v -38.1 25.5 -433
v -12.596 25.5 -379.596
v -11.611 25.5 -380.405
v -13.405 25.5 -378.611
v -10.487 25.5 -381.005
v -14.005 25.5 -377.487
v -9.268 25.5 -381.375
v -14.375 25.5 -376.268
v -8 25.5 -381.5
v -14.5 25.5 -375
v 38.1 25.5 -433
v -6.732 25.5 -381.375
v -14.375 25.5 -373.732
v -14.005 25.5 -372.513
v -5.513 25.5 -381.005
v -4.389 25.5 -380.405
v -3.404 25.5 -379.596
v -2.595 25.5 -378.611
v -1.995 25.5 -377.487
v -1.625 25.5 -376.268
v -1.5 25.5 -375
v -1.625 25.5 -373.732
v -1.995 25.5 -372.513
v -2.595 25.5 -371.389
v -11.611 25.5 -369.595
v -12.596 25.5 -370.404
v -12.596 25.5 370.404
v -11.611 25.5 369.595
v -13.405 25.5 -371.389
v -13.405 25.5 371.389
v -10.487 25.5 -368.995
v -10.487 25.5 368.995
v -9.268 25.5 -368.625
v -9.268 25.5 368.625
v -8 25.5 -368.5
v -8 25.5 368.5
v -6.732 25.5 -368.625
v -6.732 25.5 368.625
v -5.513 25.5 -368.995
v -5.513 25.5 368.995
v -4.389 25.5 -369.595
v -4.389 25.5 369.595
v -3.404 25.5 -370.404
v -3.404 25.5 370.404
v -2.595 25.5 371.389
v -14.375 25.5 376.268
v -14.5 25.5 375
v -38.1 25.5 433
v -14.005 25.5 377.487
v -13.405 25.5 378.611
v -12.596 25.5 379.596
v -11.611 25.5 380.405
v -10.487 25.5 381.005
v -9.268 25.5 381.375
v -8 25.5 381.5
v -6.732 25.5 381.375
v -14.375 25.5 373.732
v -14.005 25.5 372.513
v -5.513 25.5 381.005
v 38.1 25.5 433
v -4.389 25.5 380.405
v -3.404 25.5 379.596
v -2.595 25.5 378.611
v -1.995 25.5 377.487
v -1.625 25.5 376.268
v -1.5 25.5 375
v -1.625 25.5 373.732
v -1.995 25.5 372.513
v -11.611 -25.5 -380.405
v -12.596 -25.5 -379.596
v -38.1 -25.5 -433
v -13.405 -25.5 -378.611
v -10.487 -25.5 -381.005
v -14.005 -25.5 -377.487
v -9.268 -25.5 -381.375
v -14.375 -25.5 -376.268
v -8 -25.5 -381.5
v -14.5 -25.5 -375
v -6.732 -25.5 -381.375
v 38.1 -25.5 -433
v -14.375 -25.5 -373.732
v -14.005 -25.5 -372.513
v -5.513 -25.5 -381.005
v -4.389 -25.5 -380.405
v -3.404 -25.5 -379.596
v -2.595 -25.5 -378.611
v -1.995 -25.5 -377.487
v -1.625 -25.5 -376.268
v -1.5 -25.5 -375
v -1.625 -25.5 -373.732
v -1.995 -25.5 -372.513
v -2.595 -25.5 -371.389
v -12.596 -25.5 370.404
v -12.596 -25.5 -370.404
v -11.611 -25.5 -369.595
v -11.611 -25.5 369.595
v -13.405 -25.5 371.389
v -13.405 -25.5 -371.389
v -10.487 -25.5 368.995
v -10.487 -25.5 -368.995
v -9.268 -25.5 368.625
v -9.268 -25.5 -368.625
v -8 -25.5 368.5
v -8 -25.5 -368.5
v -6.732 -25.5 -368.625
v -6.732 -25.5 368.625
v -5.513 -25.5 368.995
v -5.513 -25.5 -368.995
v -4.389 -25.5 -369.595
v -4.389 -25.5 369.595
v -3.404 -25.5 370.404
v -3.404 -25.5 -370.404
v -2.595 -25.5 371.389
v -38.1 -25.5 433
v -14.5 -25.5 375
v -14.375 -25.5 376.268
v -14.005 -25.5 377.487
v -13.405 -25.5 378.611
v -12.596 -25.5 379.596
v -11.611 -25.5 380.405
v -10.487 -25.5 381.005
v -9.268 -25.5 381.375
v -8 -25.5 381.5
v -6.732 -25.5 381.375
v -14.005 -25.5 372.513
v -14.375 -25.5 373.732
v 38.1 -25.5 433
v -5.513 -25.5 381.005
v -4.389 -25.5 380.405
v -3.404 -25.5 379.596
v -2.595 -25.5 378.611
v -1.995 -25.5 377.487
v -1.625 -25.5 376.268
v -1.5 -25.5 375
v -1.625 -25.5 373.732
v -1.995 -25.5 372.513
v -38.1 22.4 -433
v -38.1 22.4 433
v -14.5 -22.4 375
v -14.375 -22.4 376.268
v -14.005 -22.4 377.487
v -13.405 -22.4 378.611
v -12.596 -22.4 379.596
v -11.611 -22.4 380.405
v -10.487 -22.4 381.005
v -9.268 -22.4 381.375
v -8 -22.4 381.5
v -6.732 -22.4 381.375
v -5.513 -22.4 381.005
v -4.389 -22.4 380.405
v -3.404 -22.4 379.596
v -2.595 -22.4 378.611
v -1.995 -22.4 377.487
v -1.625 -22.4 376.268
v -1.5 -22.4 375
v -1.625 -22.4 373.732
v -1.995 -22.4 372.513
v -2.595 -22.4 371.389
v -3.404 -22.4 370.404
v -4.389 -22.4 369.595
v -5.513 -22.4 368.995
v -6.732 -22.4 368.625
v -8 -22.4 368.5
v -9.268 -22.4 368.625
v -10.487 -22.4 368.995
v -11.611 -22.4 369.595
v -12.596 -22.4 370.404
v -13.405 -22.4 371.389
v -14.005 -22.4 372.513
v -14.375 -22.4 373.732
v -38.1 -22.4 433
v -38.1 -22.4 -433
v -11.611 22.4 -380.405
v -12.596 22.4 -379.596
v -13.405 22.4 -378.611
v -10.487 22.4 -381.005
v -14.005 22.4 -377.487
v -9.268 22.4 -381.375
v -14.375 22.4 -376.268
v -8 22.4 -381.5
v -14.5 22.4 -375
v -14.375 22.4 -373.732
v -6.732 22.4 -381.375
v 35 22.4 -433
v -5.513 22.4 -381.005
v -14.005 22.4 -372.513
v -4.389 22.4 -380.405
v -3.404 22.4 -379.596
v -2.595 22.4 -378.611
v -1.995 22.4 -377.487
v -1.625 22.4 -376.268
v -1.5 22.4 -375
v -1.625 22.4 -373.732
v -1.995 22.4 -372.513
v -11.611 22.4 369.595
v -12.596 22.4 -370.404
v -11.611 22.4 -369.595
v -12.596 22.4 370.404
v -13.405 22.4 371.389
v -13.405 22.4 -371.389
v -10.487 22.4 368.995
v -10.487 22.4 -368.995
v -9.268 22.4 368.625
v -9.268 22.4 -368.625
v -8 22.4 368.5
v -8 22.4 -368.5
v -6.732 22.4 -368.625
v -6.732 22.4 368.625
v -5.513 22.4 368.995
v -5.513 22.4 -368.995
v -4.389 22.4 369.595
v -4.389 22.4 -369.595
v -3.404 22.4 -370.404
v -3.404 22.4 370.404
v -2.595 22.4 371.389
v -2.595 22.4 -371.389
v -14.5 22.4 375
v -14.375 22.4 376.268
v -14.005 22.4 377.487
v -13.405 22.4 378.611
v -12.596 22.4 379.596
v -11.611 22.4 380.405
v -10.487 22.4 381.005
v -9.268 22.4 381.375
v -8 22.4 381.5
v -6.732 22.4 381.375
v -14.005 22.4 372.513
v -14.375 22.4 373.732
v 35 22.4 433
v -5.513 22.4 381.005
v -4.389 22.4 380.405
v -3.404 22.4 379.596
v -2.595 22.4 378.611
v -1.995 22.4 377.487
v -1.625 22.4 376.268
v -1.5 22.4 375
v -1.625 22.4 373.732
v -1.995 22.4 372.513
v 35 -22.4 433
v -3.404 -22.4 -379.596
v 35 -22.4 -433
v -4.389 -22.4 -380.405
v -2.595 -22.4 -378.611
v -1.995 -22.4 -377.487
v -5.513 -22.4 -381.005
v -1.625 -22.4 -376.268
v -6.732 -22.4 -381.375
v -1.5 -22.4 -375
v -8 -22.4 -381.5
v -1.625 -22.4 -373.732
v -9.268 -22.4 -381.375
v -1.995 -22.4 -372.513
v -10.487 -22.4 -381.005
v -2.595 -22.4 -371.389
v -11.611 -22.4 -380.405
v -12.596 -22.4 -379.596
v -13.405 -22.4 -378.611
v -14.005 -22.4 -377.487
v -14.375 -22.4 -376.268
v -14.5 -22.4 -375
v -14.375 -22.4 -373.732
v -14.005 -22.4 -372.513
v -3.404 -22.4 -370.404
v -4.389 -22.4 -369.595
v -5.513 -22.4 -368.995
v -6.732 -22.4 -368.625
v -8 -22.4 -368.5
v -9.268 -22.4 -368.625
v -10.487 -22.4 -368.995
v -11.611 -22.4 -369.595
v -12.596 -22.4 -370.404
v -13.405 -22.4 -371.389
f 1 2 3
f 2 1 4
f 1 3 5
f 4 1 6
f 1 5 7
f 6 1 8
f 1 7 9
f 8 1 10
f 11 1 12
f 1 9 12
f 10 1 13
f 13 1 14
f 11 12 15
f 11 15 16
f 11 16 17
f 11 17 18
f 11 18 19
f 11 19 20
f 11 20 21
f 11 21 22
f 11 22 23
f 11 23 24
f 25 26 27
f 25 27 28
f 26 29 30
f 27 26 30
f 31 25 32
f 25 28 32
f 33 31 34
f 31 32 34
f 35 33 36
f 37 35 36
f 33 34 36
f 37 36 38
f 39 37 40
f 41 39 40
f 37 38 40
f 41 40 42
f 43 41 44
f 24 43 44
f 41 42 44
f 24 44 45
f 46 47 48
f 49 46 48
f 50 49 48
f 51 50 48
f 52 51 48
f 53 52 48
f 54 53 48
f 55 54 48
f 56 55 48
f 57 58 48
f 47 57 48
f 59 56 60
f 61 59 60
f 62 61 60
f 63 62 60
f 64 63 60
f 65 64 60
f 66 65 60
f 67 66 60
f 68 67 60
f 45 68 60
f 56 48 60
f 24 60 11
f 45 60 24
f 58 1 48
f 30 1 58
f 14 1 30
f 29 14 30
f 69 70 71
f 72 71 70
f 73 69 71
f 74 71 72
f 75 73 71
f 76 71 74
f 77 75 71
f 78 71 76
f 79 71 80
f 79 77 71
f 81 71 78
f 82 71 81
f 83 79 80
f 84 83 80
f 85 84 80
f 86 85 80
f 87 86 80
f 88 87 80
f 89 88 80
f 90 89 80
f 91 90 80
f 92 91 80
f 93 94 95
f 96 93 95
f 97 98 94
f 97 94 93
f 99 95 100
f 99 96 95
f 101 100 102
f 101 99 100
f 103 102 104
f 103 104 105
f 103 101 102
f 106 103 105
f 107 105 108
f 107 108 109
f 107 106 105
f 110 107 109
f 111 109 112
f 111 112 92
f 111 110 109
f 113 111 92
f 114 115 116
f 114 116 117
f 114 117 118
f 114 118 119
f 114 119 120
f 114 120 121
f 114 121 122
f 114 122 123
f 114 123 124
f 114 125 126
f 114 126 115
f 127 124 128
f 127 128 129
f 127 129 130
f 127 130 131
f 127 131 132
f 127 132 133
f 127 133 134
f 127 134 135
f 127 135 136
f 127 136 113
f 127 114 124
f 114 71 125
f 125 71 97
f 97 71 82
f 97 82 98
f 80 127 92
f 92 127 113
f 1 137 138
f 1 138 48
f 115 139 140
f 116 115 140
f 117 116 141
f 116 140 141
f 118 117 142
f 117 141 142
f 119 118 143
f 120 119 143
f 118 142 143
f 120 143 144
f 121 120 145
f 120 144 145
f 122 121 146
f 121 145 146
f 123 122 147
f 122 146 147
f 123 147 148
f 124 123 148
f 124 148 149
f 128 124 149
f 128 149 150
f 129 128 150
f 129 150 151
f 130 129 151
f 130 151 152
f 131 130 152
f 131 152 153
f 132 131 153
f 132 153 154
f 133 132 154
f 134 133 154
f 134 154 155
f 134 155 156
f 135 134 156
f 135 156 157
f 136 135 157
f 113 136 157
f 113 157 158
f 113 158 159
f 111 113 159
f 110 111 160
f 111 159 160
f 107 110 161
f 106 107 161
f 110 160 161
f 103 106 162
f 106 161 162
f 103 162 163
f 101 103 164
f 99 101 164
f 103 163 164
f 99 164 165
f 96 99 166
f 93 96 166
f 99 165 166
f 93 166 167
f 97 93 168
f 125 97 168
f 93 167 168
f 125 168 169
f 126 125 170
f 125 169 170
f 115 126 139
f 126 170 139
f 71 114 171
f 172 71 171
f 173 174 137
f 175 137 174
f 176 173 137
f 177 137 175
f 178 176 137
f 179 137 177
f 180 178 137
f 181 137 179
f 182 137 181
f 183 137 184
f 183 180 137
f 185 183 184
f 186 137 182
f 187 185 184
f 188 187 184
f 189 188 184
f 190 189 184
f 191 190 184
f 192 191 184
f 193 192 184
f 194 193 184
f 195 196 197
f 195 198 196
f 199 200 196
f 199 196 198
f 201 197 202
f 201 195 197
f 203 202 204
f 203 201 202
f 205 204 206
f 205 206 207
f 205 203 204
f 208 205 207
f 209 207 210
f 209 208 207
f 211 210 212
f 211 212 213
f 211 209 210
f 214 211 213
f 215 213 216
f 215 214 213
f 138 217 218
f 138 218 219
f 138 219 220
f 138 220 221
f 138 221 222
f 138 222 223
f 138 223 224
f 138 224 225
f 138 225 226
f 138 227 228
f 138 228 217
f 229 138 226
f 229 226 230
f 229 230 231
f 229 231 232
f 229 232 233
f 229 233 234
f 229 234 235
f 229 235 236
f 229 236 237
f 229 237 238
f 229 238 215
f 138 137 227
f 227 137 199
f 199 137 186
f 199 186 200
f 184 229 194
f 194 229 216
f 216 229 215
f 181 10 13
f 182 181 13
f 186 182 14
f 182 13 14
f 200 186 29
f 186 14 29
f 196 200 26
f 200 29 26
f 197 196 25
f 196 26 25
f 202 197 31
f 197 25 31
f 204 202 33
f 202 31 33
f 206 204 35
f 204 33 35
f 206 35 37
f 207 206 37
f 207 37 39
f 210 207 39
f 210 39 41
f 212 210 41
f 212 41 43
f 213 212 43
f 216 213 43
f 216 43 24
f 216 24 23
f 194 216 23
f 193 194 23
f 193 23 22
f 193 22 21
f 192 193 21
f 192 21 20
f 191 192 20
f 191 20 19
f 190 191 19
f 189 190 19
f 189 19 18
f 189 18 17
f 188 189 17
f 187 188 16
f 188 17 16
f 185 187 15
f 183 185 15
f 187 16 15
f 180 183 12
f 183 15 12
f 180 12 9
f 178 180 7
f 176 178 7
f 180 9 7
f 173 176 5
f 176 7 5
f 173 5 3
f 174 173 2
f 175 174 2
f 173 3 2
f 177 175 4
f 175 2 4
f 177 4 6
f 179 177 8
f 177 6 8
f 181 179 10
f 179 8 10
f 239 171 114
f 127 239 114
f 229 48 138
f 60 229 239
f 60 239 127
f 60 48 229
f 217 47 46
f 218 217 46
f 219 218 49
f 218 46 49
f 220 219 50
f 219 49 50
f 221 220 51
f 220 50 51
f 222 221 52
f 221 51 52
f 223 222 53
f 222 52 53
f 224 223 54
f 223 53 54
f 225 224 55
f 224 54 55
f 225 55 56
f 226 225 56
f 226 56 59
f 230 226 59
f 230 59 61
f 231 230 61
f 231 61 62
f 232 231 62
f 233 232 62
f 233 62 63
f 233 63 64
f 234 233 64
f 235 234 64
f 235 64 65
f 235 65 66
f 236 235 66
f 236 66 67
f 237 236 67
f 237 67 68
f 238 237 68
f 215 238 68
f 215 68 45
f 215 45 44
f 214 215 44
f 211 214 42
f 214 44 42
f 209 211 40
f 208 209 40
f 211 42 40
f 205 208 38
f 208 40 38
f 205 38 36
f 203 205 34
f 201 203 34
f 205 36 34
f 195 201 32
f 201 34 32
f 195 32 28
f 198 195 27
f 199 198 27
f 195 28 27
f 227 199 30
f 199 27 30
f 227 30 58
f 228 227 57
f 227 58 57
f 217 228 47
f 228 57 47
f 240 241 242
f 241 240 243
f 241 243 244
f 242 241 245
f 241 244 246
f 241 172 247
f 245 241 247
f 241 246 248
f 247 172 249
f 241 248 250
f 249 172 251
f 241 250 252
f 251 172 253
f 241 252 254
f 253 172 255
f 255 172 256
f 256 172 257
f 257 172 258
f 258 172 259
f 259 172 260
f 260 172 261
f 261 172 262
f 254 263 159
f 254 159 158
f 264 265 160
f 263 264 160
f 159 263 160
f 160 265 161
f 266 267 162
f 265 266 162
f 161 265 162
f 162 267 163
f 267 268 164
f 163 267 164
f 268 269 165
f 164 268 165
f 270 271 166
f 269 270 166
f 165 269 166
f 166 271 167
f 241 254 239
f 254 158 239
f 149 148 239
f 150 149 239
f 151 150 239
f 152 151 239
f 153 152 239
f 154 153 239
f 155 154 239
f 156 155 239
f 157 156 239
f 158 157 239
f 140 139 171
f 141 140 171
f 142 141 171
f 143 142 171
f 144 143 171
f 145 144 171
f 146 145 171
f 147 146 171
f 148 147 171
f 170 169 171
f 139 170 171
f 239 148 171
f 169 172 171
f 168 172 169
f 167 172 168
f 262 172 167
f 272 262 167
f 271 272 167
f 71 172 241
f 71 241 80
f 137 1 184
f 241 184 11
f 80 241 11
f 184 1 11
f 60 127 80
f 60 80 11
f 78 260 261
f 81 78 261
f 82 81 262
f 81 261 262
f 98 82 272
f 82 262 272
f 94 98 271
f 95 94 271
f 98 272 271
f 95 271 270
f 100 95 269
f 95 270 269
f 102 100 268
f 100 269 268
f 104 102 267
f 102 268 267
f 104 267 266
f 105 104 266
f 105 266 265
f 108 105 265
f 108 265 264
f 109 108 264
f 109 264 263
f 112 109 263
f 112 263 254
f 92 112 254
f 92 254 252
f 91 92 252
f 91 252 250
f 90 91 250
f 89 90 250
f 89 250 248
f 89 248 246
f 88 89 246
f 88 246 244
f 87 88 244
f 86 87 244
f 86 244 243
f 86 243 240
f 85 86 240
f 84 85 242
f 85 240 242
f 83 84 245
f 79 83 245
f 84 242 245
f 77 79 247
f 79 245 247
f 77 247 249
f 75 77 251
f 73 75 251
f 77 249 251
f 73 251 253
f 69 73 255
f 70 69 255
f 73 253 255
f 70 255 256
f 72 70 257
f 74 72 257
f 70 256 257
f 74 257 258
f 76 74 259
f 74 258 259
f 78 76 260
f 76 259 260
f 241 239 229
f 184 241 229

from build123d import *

# Parameters (mm, degrees)
CROQUIS2_W              = 76.2
CROQUIS2_H              = 51
SALIENTE_EXTRUIR1_DEPTH = 433
CROQUIS6_W              = 70
CROQUIS6_H              = 44.8
CORTAR_EXTRUIR1_DEPTH   = 900
CROQUIS7_W              = 866
CROQUIS7_H              = 44.8
CORTAR_EXTRUIR2_DEPTH   = 20
CROQUIS8_R              = 6.5
CORTAR_EXTRUIR3_DEPTH   = 80


with BuildPart() as part:
    # Croquis2 → Saliente-Extruir1 (new, symmetric)
    with BuildSketch(Plane.XY):
        Rectangle(CROQUIS2_W, CROQUIS2_H)
    extrude(amount=SALIENTE_EXTRUIR1_DEPTH, both=True)

    # Croquis6 → Cortar-Extruir1 (cut)
    with BuildSketch(Plane.XY.offset(433)):
        Rectangle(CROQUIS6_W, CROQUIS6_H)
    extrude(amount=-CORTAR_EXTRUIR1_DEPTH, mode=Mode.SUBTRACT)

    # Croquis7 → Cortar-Extruir2 (cut)
    with BuildSketch(Plane.ZY.offset(38.1)):
        Rectangle(CROQUIS7_W, CROQUIS7_H)
    extrude(amount=-CORTAR_EXTRUIR2_DEPTH, mode=Mode.SUBTRACT)

    # Croquis8 → Cortar-Extruir3 (cut)
    with BuildSketch(Plane(origin=(0, 25.5, 0), x_dir=(1, 0, 0), z_dir=(0, 1, 0))):
        with Locations(Location((-8, 375, 0), (0, 0, 180))):
            Circle(CROQUIS8_R)
        with Locations(Location((-8, -375, 0), (0, 0, 180))):
            Circle(CROQUIS8_R)
    extrude(amount=-CORTAR_EXTRUIR3_DEPTH, mode=Mode.SUBTRACT)


solid = part.part
